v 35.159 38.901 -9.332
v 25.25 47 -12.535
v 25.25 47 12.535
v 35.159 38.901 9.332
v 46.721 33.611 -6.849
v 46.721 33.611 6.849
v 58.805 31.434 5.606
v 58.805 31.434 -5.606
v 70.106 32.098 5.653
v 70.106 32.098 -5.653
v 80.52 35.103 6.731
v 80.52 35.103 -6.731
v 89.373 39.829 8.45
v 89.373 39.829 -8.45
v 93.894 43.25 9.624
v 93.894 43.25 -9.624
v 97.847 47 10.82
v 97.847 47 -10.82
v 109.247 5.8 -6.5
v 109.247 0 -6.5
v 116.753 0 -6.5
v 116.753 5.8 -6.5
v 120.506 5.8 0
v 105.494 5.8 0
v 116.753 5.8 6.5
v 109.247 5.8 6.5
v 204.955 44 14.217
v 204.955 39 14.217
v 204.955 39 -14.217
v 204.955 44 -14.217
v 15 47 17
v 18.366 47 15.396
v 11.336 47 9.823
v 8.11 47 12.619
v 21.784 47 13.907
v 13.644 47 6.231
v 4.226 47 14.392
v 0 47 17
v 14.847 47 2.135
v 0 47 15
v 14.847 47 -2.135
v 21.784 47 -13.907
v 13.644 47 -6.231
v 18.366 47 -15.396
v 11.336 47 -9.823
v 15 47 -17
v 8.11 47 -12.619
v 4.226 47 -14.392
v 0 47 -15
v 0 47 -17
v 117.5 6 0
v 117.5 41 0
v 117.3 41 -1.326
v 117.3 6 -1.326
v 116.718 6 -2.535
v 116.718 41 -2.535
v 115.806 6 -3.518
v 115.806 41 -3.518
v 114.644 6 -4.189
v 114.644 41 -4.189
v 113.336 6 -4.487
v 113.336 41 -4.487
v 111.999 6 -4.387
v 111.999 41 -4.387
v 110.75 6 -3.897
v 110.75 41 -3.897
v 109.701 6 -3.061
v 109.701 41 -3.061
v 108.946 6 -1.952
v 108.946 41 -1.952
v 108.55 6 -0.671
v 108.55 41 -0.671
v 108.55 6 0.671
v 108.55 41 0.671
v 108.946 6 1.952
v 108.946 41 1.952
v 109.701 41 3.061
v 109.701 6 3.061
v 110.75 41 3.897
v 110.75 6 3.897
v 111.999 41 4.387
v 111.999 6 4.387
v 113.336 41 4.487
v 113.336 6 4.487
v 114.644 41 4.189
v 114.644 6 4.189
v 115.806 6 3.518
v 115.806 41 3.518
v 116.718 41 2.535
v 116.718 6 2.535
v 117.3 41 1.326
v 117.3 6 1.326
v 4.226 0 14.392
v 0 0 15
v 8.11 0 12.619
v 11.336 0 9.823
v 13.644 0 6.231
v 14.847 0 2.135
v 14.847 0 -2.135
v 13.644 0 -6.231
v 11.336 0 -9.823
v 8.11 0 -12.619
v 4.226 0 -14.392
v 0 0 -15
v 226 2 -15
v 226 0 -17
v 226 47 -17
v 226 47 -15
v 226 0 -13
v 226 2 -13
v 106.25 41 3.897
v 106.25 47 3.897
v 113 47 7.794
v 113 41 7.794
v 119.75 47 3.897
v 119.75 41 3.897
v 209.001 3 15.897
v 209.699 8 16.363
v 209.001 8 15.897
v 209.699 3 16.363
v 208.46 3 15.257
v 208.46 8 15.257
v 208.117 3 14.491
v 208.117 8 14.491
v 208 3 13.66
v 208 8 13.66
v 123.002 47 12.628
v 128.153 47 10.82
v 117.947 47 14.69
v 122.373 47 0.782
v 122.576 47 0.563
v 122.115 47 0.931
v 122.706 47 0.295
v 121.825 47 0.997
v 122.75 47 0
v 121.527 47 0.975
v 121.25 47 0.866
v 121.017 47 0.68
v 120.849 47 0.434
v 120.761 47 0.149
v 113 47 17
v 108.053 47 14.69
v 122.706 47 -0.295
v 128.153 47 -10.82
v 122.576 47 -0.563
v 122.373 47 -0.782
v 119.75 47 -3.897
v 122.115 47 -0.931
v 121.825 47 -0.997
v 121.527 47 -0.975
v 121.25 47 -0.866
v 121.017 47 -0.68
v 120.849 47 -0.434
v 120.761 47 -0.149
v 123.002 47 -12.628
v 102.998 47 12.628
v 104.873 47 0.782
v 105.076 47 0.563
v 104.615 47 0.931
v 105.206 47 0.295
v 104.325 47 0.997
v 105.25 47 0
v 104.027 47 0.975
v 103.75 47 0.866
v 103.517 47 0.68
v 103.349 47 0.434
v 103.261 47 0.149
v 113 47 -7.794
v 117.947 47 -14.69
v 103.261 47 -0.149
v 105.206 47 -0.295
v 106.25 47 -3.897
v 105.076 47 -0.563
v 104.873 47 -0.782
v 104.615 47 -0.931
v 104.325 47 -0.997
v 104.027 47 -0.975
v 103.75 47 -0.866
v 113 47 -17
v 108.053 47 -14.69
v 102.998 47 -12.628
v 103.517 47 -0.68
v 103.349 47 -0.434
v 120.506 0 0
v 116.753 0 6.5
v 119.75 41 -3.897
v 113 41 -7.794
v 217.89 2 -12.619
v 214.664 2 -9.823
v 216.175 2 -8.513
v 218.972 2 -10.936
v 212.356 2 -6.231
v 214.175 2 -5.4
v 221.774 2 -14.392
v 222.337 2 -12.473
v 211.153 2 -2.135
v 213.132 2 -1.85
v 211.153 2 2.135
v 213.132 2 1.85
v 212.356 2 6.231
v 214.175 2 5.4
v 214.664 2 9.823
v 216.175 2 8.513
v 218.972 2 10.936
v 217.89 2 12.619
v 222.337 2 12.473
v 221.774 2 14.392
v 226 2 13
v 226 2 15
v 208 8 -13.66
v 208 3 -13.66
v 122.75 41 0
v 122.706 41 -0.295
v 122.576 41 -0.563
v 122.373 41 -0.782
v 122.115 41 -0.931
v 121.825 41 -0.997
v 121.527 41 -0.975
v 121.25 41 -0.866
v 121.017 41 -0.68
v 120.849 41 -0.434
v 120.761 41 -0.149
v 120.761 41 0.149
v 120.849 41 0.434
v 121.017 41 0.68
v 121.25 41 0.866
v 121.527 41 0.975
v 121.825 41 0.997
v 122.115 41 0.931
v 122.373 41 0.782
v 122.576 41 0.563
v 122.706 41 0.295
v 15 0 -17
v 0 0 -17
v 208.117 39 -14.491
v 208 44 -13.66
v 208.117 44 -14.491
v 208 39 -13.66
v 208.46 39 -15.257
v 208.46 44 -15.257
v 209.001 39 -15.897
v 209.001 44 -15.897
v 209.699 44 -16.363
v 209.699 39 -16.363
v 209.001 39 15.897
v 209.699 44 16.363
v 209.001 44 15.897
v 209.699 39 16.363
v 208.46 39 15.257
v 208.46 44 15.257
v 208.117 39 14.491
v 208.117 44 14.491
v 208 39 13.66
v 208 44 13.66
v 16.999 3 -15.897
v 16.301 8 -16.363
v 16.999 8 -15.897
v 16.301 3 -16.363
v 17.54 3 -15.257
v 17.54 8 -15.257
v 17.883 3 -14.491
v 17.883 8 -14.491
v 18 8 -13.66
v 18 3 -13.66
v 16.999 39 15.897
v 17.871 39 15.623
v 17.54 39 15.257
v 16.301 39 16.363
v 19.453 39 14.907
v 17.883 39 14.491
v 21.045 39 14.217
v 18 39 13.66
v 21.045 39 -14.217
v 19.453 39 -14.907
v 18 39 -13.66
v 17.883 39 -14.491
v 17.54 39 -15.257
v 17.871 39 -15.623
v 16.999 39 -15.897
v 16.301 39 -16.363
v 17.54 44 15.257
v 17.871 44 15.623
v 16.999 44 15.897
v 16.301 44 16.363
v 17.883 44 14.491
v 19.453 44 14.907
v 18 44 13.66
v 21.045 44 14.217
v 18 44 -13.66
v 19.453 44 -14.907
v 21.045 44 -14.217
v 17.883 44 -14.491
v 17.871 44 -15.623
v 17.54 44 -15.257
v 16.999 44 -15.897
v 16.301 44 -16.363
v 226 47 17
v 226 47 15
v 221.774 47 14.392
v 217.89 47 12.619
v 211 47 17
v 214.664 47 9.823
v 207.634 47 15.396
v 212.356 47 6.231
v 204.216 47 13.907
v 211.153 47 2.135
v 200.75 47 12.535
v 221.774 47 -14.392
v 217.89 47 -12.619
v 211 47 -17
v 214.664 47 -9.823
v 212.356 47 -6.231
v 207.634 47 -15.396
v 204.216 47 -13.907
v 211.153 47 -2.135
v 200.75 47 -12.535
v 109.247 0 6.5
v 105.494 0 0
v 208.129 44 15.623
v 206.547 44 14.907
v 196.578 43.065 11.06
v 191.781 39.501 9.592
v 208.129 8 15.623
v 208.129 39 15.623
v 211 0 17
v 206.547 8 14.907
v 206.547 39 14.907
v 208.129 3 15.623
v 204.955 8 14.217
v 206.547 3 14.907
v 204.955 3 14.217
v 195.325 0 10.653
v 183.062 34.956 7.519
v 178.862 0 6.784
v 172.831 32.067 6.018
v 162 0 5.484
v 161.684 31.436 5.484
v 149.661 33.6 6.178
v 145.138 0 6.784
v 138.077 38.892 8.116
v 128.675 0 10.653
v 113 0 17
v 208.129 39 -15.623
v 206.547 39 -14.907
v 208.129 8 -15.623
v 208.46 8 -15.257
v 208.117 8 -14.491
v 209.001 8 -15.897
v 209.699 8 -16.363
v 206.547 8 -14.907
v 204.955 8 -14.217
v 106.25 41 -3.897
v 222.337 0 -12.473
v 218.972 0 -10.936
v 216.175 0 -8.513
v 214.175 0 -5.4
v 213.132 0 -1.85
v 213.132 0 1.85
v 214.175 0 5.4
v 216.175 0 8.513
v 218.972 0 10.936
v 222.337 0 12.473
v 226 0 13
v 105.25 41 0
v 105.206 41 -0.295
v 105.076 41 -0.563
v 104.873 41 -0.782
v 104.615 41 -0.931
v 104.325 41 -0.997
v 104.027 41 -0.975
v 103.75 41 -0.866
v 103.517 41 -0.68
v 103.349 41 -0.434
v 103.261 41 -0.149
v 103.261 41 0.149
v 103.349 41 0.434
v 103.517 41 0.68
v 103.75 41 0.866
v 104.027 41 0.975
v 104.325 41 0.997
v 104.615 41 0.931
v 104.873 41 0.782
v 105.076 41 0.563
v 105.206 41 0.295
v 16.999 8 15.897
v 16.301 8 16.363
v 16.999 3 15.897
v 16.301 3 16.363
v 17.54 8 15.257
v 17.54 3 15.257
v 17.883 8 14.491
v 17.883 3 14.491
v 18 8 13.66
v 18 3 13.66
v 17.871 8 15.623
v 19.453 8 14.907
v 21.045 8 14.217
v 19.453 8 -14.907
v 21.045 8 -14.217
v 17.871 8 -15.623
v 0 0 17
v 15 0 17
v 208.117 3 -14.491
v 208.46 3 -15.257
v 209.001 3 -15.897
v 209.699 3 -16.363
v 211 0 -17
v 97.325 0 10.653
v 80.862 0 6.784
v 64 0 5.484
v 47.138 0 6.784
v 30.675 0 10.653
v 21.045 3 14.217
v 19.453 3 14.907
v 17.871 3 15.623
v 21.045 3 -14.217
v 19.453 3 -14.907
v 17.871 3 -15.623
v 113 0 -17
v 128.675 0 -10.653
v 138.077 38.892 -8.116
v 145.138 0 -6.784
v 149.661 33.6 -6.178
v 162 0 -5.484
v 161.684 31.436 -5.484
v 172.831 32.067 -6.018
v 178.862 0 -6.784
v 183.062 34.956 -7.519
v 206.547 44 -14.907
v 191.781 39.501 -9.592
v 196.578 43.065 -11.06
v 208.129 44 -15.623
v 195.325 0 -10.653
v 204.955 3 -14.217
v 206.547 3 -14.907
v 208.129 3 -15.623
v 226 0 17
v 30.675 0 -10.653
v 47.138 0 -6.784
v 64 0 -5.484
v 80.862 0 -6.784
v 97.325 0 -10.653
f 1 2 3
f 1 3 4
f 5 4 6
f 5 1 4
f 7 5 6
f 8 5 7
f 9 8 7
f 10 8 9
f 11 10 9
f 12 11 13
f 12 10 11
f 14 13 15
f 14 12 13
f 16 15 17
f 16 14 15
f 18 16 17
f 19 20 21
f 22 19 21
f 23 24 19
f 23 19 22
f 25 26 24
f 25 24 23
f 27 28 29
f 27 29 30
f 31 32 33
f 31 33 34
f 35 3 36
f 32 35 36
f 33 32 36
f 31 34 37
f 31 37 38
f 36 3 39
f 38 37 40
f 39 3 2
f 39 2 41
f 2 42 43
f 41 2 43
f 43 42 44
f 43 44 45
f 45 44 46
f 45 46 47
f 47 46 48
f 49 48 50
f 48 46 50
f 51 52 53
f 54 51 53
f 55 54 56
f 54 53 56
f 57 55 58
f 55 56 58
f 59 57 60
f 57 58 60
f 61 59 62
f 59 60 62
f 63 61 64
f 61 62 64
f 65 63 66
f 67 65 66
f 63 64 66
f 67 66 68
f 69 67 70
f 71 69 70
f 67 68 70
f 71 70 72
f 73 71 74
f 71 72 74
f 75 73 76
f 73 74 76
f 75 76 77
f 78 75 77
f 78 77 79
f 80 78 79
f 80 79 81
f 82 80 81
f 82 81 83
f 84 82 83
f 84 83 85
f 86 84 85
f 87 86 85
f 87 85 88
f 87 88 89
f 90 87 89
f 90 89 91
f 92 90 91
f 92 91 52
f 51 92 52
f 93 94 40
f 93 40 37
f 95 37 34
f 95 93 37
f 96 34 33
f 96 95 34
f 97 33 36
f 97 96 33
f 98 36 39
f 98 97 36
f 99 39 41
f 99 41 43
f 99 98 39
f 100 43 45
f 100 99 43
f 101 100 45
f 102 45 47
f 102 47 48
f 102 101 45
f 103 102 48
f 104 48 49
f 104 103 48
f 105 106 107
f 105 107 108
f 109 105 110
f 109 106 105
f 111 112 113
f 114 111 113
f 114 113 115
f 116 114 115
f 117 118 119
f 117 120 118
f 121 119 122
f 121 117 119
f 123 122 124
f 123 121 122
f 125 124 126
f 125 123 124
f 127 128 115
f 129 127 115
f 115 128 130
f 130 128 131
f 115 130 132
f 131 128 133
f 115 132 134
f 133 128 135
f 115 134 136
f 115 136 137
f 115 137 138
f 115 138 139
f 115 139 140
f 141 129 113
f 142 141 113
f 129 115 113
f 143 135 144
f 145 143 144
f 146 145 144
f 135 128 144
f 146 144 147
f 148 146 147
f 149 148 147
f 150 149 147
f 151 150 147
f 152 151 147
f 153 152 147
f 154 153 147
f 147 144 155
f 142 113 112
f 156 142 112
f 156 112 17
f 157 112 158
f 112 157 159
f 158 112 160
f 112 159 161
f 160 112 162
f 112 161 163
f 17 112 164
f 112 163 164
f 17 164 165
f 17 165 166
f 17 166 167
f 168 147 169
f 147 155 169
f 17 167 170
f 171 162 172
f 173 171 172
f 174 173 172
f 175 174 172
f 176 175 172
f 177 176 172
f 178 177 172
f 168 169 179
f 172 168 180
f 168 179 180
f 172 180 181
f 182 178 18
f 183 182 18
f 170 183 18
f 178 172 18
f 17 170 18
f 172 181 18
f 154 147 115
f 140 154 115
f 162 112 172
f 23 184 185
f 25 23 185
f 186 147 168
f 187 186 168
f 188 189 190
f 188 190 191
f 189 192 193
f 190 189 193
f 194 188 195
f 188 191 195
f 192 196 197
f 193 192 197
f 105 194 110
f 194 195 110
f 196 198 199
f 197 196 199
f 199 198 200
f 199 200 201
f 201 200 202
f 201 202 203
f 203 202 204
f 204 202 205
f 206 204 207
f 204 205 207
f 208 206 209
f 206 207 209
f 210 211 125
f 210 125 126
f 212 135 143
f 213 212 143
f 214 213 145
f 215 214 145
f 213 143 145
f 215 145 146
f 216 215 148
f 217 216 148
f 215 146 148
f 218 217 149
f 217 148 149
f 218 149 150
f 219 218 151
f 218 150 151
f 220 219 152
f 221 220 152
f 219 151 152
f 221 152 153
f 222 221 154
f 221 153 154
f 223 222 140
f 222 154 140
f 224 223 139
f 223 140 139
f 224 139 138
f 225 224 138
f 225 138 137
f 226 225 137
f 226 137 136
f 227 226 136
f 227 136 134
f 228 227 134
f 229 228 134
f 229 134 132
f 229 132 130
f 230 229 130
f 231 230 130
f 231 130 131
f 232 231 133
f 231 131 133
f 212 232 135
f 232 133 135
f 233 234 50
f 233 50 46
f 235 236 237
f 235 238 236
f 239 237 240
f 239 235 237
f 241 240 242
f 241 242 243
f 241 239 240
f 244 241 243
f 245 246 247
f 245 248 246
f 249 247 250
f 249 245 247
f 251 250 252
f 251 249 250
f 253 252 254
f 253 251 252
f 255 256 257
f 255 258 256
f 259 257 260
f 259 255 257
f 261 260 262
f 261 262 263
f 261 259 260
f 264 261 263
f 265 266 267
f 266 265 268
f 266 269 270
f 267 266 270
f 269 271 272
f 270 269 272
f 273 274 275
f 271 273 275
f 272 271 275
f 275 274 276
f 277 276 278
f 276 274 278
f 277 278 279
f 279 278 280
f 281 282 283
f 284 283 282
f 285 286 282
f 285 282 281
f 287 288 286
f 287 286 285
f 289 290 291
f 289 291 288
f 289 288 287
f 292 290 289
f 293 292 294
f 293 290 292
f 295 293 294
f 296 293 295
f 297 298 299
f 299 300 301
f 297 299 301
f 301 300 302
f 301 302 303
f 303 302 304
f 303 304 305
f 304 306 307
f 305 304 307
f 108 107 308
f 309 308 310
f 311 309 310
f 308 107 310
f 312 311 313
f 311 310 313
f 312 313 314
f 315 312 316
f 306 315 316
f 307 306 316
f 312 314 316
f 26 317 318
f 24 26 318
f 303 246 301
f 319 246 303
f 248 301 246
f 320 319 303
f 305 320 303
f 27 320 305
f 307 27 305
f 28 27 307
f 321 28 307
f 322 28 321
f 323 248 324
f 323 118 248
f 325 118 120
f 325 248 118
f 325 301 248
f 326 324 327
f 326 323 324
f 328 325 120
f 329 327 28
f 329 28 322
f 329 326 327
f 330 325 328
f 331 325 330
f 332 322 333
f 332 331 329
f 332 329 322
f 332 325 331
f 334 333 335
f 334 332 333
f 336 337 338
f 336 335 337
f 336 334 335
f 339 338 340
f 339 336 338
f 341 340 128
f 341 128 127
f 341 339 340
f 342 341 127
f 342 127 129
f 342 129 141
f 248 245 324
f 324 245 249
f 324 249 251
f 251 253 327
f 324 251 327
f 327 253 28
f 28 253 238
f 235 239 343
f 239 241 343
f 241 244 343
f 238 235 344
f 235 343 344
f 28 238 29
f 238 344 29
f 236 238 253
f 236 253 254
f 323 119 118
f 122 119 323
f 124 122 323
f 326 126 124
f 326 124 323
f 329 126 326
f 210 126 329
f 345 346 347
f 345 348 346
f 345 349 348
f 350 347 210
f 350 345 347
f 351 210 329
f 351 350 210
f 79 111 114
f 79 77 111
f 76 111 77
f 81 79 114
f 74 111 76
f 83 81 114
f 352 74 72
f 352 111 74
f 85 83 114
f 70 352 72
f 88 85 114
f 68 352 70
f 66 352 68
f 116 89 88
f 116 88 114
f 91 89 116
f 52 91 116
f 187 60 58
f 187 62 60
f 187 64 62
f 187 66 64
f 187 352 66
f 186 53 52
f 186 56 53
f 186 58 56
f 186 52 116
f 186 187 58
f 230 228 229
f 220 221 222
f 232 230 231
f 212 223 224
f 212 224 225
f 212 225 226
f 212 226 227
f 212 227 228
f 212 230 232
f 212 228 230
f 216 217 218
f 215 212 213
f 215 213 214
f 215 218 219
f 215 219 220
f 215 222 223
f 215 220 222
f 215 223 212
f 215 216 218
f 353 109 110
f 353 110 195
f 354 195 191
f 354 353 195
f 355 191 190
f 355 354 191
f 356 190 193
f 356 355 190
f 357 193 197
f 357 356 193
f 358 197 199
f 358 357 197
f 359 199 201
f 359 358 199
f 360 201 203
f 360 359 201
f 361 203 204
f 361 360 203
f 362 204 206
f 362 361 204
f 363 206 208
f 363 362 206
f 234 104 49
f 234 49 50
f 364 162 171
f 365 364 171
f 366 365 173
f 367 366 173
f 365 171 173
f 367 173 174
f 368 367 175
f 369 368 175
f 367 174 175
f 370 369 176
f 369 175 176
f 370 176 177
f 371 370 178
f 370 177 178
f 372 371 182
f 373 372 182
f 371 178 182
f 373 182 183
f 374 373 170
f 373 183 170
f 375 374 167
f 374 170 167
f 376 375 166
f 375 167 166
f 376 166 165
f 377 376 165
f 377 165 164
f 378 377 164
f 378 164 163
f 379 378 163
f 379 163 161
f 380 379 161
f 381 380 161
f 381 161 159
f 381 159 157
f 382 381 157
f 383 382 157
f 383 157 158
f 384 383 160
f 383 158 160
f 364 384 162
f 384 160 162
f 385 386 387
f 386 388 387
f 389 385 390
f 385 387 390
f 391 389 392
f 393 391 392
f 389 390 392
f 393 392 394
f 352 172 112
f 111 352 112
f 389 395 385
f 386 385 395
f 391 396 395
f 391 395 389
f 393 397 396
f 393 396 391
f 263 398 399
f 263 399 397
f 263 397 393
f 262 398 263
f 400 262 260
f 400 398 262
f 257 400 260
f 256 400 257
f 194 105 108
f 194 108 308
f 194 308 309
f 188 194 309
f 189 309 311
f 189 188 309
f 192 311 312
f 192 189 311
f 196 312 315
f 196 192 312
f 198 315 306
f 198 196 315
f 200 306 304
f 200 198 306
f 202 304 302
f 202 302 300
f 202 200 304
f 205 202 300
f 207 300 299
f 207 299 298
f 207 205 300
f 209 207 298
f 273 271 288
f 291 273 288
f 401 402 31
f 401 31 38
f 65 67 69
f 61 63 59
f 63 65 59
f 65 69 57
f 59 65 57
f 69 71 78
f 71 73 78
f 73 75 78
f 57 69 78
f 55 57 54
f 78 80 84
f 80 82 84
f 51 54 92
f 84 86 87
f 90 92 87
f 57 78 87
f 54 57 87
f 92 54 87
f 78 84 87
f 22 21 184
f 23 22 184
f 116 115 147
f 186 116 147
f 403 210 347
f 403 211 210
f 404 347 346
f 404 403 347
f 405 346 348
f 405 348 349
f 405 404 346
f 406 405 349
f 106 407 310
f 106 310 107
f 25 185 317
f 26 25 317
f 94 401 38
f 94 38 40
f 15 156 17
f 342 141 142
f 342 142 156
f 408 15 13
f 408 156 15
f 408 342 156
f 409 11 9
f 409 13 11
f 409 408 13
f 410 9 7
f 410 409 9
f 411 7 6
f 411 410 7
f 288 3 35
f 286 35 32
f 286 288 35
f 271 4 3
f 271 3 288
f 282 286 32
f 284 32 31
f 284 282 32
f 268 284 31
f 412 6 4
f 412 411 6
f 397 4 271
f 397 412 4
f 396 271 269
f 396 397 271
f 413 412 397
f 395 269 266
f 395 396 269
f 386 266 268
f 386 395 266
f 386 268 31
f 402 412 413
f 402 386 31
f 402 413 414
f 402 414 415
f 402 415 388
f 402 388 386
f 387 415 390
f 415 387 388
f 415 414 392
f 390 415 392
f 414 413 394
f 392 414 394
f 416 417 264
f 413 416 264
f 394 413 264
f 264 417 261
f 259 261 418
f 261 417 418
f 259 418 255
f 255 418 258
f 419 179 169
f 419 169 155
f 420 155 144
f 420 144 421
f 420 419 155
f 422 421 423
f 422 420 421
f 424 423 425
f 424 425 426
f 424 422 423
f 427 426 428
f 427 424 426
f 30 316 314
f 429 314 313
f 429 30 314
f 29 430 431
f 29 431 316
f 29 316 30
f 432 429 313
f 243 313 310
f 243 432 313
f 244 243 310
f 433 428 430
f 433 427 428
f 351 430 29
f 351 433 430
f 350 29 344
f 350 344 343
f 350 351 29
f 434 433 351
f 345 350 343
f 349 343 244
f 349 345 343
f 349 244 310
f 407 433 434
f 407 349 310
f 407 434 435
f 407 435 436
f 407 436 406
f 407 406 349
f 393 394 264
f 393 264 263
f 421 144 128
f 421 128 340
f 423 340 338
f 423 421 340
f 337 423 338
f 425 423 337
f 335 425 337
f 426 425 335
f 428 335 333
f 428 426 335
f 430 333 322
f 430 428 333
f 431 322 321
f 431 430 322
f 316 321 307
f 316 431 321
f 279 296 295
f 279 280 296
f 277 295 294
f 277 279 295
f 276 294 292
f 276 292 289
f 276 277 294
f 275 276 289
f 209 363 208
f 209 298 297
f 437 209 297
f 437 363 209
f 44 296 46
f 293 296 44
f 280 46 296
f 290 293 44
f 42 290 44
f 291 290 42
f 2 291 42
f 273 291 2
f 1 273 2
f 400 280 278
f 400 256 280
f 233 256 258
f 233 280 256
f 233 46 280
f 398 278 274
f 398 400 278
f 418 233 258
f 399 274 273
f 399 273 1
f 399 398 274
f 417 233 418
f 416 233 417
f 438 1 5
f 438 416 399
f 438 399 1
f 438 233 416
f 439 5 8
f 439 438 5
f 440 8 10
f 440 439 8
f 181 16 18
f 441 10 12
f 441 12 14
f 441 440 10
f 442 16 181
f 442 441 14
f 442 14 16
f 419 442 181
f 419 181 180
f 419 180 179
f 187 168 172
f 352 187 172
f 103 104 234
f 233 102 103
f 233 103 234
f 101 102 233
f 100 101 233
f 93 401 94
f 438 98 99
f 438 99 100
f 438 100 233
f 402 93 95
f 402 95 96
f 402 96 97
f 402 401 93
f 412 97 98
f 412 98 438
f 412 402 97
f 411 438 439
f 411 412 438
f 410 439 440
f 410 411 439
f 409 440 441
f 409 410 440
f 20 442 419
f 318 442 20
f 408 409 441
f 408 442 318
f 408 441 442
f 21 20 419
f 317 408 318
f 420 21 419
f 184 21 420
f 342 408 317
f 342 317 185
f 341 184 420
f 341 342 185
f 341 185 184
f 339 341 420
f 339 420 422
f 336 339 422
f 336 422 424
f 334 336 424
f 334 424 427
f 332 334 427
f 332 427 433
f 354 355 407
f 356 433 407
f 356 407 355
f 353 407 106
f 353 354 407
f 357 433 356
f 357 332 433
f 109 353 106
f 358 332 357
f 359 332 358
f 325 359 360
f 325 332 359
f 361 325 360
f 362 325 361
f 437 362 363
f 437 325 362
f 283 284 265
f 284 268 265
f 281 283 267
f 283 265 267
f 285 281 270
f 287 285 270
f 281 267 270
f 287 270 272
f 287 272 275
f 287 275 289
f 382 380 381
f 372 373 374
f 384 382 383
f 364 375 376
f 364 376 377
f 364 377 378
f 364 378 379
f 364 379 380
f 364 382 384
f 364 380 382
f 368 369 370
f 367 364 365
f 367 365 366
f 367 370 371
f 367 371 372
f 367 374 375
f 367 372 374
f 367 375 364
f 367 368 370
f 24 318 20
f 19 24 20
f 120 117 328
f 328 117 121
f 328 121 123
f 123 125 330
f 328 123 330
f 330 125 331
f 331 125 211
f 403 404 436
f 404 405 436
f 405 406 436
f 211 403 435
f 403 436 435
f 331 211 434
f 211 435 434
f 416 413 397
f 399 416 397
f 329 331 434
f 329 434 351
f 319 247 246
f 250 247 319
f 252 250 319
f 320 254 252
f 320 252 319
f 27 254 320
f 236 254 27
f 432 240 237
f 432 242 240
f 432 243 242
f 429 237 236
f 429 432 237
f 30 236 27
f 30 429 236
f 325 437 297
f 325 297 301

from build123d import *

# Parameters (mm, degrees)
BOSS_EXTRUDE2_DEPTH = 47
SKETCH2_R           = 4.5
CUT_EXTRUDE1_DEPTH  = 48
CUT_EXTRUDE2_DEPTH  = 6
SKETCH4_R           = 1
CUT_EXTRUDE3_DEPTH  = 6
CUT_EXTRUDE4_DEPTH  = 35
CUT_EXTRUDE5_DEPTH  = 6
BOSS_EXTRUDE3_DEPTH = 0.2
BOSS_EXTRUDE4_DEPTH = 2
SKETCH11_W          = 3.045387933
SKETCH11_H          = 5
CUT_EXTRUDE6_DEPTH  = 35.0000001
FILLET1_R           = 3
FILLET2_R           = 3


with BuildPart() as part:
    # Sketch1 → Boss-Extrude2 (new body)
    with BuildSketch(Plane(origin=(0, 0, 0), x_dir=(1, 0, 0), z_dir=(0, 1, 0))):
        with BuildLine():
            Line((0, 15), (0, 17))
            Line((0, 17), (15, 17))
            ThreePointArc((15, 17), (64, 5.483501156), (113, 17))
            ThreePointArc((113, 17), (162, 5.483501156), (211, 17))
            Line((211, 17), (226, 17))
            Line((226, 17), (226, 15))
            ThreePointArc((226, 15), (211, 0), (226, -15))
            Line((226, -15), (226, -17))
            Line((226, -17), (211, -17))
            ThreePointArc((211, -17), (162, -5.483501156), (113, -17))
            ThreePointArc((113, -17), (64, -5.483501156), (15, -17))
            Line((15, -17), (0, -17))
            Line((0, -17), (0, -15))
            ThreePointArc((0, -15), (15, 0), (0, 15))
        make_face()
    extrude(amount=BOSS_EXTRUDE2_DEPTH)

    # Sketch2 → Cut-Extrude1 (cut, through all)
    with BuildSketch(Plane(origin=(0, 47, 0), x_dir=(1, 0, 0), z_dir=(0, 1, 0))):
        with Locations((113, 0)):
            Circle(SKETCH2_R)
    extrude(amount=-CUT_EXTRUDE1_DEPTH, mode=Mode.SUBTRACT)

    # Sketch3 → Cut-Extrude2 (cut)
    with BuildSketch(Plane(origin=(0, 47, 0), x_dir=(1, 0, 0), z_dir=(0, 1, 0))):
        Polygon((113, -7.794228634), (119.75, -3.897114317), (119.75, 3.897114317), (113, 7.794228634), (106.25, 3.897114317), (106.25, -3.897114317), align=None)
    extrude(amount=-CUT_EXTRUDE2_DEPTH, mode=Mode.SUBTRACT)

    # Sketch4 → Cut-Extrude3 (cut)
    with BuildSketch(Plane(origin=(0, 47, 0), x_dir=(1, 0, 0), z_dir=(0, 1, 0))):
        with Locations((104.25, 0)):
            Circle(SKETCH4_R)
        with Locations((121.75, 0)):
            Circle(SKETCH4_R)
    extrude(amount=-CUT_EXTRUDE3_DEPTH, mode=Mode.SUBTRACT)

    # Sketch5 → Cut-Extrude4 (cut, through all)
    with BuildSketch(Plane(origin=(0, 0, -17), x_dir=(-1, 0, 0), z_dir=(0, 0, -1))):
        with BuildLine():
            Line((-200.749560542, 47), (-128.153486501, 47))
            ThreePointArc((-128.153486501, 47), (-164.451523522, 31.359045891), (-200.749560542, 47))
        make_face()
        with BuildLine():
            ThreePointArc((-25.250439458, 47), (-61.548476478, 31.359045891), (-97.846513499, 47))
            Line((-97.846513499, 47), (-25.250439458, 47))
        make_face()
    extrude(amount=-CUT_EXTRUDE4_DEPTH, mode=Mode.SUBTRACT)

    # Sketch6 → Cut-Extrude5 (cut)
    with BuildSketch(Plane.XZ):
        Polygon((120.505553499, 0), (116.75277675, 6.5), (109.24722325, 6.5), (105.494446501, 0), (109.24722325, -6.5), (116.75277675, -6.5), align=None)
    extrude(amount=-CUT_EXTRUDE5_DEPTH, mode=Mode.SUBTRACT)

    # Sketch7 → Boss-Extrude3 (add)
    with BuildSketch(Plane.XZ.offset(-6)):
        Polygon((120.505553499, 0), (116.75277675, 6.5), (109.24722325, 6.5), (105.494446501, 0), (109.24722325, -6.5), (116.75277675, -6.5), align=None)
    extrude(amount=BOSS_EXTRUDE3_DEPTH)

    # Sketch10 → Boss-Extrude4 (add)
    with BuildSketch(Plane.XZ):
        with BuildLine():
            ThreePointArc((226, -13), (213, 0), (226, 13))
            Line((226, 13), (226, 15))
            ThreePointArc((226, 15), (211, 0), (226, -15))
            Line((226, -15), (226, -13))
        make_face()
    extrude(amount=-BOSS_EXTRUDE4_DEPTH)

    # Sketch11 → Cut-Extrude6 (cut, through all)
    with BuildSketch(Plane(origin=(0, 0, -17), x_dir=(-1, 0, 0), z_dir=(0, 0, -1))):
        with Locations((-19.522693967, 41.5)):
            Rectangle(SKETCH11_W, SKETCH11_H)
        with Locations((-19.522693967, 5.5)):
            Rectangle(SKETCH11_W, SKETCH11_H)
        with Locations((-206.477306033, 5.5)):
            Rectangle(SKETCH11_W, SKETCH11_H)
        with Locations((-206.477306033, 41.5)):
            Rectangle(SKETCH11_W, SKETCH11_H)
    extrude(amount=-CUT_EXTRUDE6_DEPTH, mode=Mode.SUBTRACT)

    # Fillet1
    fillet1_edges = [part.edges().sort_by_distance(p)[0] for p in [
        (18, 41.5, -15.563533182),
        (18, 5.5, -15.563533182),
    ]]
    fillet(fillet1_edges, radius=FILLET1_R)

    # Fillet2
    fillet2_edges = [part.edges().sort_by_distance(p)[0] for p in [
        (18, 41.5, 15.563533182),
        (18, 5.5, 15.563533182),
        (208, 5.5, -15.563533182),
        (208, 5.5, 15.563533182),
        (208, 41.5, -15.563533182),
        (208, 41.5, 15.563533182),
    ]]
    fillet(fillet2_edges, radius=FILLET2_R)


solid = part.part
